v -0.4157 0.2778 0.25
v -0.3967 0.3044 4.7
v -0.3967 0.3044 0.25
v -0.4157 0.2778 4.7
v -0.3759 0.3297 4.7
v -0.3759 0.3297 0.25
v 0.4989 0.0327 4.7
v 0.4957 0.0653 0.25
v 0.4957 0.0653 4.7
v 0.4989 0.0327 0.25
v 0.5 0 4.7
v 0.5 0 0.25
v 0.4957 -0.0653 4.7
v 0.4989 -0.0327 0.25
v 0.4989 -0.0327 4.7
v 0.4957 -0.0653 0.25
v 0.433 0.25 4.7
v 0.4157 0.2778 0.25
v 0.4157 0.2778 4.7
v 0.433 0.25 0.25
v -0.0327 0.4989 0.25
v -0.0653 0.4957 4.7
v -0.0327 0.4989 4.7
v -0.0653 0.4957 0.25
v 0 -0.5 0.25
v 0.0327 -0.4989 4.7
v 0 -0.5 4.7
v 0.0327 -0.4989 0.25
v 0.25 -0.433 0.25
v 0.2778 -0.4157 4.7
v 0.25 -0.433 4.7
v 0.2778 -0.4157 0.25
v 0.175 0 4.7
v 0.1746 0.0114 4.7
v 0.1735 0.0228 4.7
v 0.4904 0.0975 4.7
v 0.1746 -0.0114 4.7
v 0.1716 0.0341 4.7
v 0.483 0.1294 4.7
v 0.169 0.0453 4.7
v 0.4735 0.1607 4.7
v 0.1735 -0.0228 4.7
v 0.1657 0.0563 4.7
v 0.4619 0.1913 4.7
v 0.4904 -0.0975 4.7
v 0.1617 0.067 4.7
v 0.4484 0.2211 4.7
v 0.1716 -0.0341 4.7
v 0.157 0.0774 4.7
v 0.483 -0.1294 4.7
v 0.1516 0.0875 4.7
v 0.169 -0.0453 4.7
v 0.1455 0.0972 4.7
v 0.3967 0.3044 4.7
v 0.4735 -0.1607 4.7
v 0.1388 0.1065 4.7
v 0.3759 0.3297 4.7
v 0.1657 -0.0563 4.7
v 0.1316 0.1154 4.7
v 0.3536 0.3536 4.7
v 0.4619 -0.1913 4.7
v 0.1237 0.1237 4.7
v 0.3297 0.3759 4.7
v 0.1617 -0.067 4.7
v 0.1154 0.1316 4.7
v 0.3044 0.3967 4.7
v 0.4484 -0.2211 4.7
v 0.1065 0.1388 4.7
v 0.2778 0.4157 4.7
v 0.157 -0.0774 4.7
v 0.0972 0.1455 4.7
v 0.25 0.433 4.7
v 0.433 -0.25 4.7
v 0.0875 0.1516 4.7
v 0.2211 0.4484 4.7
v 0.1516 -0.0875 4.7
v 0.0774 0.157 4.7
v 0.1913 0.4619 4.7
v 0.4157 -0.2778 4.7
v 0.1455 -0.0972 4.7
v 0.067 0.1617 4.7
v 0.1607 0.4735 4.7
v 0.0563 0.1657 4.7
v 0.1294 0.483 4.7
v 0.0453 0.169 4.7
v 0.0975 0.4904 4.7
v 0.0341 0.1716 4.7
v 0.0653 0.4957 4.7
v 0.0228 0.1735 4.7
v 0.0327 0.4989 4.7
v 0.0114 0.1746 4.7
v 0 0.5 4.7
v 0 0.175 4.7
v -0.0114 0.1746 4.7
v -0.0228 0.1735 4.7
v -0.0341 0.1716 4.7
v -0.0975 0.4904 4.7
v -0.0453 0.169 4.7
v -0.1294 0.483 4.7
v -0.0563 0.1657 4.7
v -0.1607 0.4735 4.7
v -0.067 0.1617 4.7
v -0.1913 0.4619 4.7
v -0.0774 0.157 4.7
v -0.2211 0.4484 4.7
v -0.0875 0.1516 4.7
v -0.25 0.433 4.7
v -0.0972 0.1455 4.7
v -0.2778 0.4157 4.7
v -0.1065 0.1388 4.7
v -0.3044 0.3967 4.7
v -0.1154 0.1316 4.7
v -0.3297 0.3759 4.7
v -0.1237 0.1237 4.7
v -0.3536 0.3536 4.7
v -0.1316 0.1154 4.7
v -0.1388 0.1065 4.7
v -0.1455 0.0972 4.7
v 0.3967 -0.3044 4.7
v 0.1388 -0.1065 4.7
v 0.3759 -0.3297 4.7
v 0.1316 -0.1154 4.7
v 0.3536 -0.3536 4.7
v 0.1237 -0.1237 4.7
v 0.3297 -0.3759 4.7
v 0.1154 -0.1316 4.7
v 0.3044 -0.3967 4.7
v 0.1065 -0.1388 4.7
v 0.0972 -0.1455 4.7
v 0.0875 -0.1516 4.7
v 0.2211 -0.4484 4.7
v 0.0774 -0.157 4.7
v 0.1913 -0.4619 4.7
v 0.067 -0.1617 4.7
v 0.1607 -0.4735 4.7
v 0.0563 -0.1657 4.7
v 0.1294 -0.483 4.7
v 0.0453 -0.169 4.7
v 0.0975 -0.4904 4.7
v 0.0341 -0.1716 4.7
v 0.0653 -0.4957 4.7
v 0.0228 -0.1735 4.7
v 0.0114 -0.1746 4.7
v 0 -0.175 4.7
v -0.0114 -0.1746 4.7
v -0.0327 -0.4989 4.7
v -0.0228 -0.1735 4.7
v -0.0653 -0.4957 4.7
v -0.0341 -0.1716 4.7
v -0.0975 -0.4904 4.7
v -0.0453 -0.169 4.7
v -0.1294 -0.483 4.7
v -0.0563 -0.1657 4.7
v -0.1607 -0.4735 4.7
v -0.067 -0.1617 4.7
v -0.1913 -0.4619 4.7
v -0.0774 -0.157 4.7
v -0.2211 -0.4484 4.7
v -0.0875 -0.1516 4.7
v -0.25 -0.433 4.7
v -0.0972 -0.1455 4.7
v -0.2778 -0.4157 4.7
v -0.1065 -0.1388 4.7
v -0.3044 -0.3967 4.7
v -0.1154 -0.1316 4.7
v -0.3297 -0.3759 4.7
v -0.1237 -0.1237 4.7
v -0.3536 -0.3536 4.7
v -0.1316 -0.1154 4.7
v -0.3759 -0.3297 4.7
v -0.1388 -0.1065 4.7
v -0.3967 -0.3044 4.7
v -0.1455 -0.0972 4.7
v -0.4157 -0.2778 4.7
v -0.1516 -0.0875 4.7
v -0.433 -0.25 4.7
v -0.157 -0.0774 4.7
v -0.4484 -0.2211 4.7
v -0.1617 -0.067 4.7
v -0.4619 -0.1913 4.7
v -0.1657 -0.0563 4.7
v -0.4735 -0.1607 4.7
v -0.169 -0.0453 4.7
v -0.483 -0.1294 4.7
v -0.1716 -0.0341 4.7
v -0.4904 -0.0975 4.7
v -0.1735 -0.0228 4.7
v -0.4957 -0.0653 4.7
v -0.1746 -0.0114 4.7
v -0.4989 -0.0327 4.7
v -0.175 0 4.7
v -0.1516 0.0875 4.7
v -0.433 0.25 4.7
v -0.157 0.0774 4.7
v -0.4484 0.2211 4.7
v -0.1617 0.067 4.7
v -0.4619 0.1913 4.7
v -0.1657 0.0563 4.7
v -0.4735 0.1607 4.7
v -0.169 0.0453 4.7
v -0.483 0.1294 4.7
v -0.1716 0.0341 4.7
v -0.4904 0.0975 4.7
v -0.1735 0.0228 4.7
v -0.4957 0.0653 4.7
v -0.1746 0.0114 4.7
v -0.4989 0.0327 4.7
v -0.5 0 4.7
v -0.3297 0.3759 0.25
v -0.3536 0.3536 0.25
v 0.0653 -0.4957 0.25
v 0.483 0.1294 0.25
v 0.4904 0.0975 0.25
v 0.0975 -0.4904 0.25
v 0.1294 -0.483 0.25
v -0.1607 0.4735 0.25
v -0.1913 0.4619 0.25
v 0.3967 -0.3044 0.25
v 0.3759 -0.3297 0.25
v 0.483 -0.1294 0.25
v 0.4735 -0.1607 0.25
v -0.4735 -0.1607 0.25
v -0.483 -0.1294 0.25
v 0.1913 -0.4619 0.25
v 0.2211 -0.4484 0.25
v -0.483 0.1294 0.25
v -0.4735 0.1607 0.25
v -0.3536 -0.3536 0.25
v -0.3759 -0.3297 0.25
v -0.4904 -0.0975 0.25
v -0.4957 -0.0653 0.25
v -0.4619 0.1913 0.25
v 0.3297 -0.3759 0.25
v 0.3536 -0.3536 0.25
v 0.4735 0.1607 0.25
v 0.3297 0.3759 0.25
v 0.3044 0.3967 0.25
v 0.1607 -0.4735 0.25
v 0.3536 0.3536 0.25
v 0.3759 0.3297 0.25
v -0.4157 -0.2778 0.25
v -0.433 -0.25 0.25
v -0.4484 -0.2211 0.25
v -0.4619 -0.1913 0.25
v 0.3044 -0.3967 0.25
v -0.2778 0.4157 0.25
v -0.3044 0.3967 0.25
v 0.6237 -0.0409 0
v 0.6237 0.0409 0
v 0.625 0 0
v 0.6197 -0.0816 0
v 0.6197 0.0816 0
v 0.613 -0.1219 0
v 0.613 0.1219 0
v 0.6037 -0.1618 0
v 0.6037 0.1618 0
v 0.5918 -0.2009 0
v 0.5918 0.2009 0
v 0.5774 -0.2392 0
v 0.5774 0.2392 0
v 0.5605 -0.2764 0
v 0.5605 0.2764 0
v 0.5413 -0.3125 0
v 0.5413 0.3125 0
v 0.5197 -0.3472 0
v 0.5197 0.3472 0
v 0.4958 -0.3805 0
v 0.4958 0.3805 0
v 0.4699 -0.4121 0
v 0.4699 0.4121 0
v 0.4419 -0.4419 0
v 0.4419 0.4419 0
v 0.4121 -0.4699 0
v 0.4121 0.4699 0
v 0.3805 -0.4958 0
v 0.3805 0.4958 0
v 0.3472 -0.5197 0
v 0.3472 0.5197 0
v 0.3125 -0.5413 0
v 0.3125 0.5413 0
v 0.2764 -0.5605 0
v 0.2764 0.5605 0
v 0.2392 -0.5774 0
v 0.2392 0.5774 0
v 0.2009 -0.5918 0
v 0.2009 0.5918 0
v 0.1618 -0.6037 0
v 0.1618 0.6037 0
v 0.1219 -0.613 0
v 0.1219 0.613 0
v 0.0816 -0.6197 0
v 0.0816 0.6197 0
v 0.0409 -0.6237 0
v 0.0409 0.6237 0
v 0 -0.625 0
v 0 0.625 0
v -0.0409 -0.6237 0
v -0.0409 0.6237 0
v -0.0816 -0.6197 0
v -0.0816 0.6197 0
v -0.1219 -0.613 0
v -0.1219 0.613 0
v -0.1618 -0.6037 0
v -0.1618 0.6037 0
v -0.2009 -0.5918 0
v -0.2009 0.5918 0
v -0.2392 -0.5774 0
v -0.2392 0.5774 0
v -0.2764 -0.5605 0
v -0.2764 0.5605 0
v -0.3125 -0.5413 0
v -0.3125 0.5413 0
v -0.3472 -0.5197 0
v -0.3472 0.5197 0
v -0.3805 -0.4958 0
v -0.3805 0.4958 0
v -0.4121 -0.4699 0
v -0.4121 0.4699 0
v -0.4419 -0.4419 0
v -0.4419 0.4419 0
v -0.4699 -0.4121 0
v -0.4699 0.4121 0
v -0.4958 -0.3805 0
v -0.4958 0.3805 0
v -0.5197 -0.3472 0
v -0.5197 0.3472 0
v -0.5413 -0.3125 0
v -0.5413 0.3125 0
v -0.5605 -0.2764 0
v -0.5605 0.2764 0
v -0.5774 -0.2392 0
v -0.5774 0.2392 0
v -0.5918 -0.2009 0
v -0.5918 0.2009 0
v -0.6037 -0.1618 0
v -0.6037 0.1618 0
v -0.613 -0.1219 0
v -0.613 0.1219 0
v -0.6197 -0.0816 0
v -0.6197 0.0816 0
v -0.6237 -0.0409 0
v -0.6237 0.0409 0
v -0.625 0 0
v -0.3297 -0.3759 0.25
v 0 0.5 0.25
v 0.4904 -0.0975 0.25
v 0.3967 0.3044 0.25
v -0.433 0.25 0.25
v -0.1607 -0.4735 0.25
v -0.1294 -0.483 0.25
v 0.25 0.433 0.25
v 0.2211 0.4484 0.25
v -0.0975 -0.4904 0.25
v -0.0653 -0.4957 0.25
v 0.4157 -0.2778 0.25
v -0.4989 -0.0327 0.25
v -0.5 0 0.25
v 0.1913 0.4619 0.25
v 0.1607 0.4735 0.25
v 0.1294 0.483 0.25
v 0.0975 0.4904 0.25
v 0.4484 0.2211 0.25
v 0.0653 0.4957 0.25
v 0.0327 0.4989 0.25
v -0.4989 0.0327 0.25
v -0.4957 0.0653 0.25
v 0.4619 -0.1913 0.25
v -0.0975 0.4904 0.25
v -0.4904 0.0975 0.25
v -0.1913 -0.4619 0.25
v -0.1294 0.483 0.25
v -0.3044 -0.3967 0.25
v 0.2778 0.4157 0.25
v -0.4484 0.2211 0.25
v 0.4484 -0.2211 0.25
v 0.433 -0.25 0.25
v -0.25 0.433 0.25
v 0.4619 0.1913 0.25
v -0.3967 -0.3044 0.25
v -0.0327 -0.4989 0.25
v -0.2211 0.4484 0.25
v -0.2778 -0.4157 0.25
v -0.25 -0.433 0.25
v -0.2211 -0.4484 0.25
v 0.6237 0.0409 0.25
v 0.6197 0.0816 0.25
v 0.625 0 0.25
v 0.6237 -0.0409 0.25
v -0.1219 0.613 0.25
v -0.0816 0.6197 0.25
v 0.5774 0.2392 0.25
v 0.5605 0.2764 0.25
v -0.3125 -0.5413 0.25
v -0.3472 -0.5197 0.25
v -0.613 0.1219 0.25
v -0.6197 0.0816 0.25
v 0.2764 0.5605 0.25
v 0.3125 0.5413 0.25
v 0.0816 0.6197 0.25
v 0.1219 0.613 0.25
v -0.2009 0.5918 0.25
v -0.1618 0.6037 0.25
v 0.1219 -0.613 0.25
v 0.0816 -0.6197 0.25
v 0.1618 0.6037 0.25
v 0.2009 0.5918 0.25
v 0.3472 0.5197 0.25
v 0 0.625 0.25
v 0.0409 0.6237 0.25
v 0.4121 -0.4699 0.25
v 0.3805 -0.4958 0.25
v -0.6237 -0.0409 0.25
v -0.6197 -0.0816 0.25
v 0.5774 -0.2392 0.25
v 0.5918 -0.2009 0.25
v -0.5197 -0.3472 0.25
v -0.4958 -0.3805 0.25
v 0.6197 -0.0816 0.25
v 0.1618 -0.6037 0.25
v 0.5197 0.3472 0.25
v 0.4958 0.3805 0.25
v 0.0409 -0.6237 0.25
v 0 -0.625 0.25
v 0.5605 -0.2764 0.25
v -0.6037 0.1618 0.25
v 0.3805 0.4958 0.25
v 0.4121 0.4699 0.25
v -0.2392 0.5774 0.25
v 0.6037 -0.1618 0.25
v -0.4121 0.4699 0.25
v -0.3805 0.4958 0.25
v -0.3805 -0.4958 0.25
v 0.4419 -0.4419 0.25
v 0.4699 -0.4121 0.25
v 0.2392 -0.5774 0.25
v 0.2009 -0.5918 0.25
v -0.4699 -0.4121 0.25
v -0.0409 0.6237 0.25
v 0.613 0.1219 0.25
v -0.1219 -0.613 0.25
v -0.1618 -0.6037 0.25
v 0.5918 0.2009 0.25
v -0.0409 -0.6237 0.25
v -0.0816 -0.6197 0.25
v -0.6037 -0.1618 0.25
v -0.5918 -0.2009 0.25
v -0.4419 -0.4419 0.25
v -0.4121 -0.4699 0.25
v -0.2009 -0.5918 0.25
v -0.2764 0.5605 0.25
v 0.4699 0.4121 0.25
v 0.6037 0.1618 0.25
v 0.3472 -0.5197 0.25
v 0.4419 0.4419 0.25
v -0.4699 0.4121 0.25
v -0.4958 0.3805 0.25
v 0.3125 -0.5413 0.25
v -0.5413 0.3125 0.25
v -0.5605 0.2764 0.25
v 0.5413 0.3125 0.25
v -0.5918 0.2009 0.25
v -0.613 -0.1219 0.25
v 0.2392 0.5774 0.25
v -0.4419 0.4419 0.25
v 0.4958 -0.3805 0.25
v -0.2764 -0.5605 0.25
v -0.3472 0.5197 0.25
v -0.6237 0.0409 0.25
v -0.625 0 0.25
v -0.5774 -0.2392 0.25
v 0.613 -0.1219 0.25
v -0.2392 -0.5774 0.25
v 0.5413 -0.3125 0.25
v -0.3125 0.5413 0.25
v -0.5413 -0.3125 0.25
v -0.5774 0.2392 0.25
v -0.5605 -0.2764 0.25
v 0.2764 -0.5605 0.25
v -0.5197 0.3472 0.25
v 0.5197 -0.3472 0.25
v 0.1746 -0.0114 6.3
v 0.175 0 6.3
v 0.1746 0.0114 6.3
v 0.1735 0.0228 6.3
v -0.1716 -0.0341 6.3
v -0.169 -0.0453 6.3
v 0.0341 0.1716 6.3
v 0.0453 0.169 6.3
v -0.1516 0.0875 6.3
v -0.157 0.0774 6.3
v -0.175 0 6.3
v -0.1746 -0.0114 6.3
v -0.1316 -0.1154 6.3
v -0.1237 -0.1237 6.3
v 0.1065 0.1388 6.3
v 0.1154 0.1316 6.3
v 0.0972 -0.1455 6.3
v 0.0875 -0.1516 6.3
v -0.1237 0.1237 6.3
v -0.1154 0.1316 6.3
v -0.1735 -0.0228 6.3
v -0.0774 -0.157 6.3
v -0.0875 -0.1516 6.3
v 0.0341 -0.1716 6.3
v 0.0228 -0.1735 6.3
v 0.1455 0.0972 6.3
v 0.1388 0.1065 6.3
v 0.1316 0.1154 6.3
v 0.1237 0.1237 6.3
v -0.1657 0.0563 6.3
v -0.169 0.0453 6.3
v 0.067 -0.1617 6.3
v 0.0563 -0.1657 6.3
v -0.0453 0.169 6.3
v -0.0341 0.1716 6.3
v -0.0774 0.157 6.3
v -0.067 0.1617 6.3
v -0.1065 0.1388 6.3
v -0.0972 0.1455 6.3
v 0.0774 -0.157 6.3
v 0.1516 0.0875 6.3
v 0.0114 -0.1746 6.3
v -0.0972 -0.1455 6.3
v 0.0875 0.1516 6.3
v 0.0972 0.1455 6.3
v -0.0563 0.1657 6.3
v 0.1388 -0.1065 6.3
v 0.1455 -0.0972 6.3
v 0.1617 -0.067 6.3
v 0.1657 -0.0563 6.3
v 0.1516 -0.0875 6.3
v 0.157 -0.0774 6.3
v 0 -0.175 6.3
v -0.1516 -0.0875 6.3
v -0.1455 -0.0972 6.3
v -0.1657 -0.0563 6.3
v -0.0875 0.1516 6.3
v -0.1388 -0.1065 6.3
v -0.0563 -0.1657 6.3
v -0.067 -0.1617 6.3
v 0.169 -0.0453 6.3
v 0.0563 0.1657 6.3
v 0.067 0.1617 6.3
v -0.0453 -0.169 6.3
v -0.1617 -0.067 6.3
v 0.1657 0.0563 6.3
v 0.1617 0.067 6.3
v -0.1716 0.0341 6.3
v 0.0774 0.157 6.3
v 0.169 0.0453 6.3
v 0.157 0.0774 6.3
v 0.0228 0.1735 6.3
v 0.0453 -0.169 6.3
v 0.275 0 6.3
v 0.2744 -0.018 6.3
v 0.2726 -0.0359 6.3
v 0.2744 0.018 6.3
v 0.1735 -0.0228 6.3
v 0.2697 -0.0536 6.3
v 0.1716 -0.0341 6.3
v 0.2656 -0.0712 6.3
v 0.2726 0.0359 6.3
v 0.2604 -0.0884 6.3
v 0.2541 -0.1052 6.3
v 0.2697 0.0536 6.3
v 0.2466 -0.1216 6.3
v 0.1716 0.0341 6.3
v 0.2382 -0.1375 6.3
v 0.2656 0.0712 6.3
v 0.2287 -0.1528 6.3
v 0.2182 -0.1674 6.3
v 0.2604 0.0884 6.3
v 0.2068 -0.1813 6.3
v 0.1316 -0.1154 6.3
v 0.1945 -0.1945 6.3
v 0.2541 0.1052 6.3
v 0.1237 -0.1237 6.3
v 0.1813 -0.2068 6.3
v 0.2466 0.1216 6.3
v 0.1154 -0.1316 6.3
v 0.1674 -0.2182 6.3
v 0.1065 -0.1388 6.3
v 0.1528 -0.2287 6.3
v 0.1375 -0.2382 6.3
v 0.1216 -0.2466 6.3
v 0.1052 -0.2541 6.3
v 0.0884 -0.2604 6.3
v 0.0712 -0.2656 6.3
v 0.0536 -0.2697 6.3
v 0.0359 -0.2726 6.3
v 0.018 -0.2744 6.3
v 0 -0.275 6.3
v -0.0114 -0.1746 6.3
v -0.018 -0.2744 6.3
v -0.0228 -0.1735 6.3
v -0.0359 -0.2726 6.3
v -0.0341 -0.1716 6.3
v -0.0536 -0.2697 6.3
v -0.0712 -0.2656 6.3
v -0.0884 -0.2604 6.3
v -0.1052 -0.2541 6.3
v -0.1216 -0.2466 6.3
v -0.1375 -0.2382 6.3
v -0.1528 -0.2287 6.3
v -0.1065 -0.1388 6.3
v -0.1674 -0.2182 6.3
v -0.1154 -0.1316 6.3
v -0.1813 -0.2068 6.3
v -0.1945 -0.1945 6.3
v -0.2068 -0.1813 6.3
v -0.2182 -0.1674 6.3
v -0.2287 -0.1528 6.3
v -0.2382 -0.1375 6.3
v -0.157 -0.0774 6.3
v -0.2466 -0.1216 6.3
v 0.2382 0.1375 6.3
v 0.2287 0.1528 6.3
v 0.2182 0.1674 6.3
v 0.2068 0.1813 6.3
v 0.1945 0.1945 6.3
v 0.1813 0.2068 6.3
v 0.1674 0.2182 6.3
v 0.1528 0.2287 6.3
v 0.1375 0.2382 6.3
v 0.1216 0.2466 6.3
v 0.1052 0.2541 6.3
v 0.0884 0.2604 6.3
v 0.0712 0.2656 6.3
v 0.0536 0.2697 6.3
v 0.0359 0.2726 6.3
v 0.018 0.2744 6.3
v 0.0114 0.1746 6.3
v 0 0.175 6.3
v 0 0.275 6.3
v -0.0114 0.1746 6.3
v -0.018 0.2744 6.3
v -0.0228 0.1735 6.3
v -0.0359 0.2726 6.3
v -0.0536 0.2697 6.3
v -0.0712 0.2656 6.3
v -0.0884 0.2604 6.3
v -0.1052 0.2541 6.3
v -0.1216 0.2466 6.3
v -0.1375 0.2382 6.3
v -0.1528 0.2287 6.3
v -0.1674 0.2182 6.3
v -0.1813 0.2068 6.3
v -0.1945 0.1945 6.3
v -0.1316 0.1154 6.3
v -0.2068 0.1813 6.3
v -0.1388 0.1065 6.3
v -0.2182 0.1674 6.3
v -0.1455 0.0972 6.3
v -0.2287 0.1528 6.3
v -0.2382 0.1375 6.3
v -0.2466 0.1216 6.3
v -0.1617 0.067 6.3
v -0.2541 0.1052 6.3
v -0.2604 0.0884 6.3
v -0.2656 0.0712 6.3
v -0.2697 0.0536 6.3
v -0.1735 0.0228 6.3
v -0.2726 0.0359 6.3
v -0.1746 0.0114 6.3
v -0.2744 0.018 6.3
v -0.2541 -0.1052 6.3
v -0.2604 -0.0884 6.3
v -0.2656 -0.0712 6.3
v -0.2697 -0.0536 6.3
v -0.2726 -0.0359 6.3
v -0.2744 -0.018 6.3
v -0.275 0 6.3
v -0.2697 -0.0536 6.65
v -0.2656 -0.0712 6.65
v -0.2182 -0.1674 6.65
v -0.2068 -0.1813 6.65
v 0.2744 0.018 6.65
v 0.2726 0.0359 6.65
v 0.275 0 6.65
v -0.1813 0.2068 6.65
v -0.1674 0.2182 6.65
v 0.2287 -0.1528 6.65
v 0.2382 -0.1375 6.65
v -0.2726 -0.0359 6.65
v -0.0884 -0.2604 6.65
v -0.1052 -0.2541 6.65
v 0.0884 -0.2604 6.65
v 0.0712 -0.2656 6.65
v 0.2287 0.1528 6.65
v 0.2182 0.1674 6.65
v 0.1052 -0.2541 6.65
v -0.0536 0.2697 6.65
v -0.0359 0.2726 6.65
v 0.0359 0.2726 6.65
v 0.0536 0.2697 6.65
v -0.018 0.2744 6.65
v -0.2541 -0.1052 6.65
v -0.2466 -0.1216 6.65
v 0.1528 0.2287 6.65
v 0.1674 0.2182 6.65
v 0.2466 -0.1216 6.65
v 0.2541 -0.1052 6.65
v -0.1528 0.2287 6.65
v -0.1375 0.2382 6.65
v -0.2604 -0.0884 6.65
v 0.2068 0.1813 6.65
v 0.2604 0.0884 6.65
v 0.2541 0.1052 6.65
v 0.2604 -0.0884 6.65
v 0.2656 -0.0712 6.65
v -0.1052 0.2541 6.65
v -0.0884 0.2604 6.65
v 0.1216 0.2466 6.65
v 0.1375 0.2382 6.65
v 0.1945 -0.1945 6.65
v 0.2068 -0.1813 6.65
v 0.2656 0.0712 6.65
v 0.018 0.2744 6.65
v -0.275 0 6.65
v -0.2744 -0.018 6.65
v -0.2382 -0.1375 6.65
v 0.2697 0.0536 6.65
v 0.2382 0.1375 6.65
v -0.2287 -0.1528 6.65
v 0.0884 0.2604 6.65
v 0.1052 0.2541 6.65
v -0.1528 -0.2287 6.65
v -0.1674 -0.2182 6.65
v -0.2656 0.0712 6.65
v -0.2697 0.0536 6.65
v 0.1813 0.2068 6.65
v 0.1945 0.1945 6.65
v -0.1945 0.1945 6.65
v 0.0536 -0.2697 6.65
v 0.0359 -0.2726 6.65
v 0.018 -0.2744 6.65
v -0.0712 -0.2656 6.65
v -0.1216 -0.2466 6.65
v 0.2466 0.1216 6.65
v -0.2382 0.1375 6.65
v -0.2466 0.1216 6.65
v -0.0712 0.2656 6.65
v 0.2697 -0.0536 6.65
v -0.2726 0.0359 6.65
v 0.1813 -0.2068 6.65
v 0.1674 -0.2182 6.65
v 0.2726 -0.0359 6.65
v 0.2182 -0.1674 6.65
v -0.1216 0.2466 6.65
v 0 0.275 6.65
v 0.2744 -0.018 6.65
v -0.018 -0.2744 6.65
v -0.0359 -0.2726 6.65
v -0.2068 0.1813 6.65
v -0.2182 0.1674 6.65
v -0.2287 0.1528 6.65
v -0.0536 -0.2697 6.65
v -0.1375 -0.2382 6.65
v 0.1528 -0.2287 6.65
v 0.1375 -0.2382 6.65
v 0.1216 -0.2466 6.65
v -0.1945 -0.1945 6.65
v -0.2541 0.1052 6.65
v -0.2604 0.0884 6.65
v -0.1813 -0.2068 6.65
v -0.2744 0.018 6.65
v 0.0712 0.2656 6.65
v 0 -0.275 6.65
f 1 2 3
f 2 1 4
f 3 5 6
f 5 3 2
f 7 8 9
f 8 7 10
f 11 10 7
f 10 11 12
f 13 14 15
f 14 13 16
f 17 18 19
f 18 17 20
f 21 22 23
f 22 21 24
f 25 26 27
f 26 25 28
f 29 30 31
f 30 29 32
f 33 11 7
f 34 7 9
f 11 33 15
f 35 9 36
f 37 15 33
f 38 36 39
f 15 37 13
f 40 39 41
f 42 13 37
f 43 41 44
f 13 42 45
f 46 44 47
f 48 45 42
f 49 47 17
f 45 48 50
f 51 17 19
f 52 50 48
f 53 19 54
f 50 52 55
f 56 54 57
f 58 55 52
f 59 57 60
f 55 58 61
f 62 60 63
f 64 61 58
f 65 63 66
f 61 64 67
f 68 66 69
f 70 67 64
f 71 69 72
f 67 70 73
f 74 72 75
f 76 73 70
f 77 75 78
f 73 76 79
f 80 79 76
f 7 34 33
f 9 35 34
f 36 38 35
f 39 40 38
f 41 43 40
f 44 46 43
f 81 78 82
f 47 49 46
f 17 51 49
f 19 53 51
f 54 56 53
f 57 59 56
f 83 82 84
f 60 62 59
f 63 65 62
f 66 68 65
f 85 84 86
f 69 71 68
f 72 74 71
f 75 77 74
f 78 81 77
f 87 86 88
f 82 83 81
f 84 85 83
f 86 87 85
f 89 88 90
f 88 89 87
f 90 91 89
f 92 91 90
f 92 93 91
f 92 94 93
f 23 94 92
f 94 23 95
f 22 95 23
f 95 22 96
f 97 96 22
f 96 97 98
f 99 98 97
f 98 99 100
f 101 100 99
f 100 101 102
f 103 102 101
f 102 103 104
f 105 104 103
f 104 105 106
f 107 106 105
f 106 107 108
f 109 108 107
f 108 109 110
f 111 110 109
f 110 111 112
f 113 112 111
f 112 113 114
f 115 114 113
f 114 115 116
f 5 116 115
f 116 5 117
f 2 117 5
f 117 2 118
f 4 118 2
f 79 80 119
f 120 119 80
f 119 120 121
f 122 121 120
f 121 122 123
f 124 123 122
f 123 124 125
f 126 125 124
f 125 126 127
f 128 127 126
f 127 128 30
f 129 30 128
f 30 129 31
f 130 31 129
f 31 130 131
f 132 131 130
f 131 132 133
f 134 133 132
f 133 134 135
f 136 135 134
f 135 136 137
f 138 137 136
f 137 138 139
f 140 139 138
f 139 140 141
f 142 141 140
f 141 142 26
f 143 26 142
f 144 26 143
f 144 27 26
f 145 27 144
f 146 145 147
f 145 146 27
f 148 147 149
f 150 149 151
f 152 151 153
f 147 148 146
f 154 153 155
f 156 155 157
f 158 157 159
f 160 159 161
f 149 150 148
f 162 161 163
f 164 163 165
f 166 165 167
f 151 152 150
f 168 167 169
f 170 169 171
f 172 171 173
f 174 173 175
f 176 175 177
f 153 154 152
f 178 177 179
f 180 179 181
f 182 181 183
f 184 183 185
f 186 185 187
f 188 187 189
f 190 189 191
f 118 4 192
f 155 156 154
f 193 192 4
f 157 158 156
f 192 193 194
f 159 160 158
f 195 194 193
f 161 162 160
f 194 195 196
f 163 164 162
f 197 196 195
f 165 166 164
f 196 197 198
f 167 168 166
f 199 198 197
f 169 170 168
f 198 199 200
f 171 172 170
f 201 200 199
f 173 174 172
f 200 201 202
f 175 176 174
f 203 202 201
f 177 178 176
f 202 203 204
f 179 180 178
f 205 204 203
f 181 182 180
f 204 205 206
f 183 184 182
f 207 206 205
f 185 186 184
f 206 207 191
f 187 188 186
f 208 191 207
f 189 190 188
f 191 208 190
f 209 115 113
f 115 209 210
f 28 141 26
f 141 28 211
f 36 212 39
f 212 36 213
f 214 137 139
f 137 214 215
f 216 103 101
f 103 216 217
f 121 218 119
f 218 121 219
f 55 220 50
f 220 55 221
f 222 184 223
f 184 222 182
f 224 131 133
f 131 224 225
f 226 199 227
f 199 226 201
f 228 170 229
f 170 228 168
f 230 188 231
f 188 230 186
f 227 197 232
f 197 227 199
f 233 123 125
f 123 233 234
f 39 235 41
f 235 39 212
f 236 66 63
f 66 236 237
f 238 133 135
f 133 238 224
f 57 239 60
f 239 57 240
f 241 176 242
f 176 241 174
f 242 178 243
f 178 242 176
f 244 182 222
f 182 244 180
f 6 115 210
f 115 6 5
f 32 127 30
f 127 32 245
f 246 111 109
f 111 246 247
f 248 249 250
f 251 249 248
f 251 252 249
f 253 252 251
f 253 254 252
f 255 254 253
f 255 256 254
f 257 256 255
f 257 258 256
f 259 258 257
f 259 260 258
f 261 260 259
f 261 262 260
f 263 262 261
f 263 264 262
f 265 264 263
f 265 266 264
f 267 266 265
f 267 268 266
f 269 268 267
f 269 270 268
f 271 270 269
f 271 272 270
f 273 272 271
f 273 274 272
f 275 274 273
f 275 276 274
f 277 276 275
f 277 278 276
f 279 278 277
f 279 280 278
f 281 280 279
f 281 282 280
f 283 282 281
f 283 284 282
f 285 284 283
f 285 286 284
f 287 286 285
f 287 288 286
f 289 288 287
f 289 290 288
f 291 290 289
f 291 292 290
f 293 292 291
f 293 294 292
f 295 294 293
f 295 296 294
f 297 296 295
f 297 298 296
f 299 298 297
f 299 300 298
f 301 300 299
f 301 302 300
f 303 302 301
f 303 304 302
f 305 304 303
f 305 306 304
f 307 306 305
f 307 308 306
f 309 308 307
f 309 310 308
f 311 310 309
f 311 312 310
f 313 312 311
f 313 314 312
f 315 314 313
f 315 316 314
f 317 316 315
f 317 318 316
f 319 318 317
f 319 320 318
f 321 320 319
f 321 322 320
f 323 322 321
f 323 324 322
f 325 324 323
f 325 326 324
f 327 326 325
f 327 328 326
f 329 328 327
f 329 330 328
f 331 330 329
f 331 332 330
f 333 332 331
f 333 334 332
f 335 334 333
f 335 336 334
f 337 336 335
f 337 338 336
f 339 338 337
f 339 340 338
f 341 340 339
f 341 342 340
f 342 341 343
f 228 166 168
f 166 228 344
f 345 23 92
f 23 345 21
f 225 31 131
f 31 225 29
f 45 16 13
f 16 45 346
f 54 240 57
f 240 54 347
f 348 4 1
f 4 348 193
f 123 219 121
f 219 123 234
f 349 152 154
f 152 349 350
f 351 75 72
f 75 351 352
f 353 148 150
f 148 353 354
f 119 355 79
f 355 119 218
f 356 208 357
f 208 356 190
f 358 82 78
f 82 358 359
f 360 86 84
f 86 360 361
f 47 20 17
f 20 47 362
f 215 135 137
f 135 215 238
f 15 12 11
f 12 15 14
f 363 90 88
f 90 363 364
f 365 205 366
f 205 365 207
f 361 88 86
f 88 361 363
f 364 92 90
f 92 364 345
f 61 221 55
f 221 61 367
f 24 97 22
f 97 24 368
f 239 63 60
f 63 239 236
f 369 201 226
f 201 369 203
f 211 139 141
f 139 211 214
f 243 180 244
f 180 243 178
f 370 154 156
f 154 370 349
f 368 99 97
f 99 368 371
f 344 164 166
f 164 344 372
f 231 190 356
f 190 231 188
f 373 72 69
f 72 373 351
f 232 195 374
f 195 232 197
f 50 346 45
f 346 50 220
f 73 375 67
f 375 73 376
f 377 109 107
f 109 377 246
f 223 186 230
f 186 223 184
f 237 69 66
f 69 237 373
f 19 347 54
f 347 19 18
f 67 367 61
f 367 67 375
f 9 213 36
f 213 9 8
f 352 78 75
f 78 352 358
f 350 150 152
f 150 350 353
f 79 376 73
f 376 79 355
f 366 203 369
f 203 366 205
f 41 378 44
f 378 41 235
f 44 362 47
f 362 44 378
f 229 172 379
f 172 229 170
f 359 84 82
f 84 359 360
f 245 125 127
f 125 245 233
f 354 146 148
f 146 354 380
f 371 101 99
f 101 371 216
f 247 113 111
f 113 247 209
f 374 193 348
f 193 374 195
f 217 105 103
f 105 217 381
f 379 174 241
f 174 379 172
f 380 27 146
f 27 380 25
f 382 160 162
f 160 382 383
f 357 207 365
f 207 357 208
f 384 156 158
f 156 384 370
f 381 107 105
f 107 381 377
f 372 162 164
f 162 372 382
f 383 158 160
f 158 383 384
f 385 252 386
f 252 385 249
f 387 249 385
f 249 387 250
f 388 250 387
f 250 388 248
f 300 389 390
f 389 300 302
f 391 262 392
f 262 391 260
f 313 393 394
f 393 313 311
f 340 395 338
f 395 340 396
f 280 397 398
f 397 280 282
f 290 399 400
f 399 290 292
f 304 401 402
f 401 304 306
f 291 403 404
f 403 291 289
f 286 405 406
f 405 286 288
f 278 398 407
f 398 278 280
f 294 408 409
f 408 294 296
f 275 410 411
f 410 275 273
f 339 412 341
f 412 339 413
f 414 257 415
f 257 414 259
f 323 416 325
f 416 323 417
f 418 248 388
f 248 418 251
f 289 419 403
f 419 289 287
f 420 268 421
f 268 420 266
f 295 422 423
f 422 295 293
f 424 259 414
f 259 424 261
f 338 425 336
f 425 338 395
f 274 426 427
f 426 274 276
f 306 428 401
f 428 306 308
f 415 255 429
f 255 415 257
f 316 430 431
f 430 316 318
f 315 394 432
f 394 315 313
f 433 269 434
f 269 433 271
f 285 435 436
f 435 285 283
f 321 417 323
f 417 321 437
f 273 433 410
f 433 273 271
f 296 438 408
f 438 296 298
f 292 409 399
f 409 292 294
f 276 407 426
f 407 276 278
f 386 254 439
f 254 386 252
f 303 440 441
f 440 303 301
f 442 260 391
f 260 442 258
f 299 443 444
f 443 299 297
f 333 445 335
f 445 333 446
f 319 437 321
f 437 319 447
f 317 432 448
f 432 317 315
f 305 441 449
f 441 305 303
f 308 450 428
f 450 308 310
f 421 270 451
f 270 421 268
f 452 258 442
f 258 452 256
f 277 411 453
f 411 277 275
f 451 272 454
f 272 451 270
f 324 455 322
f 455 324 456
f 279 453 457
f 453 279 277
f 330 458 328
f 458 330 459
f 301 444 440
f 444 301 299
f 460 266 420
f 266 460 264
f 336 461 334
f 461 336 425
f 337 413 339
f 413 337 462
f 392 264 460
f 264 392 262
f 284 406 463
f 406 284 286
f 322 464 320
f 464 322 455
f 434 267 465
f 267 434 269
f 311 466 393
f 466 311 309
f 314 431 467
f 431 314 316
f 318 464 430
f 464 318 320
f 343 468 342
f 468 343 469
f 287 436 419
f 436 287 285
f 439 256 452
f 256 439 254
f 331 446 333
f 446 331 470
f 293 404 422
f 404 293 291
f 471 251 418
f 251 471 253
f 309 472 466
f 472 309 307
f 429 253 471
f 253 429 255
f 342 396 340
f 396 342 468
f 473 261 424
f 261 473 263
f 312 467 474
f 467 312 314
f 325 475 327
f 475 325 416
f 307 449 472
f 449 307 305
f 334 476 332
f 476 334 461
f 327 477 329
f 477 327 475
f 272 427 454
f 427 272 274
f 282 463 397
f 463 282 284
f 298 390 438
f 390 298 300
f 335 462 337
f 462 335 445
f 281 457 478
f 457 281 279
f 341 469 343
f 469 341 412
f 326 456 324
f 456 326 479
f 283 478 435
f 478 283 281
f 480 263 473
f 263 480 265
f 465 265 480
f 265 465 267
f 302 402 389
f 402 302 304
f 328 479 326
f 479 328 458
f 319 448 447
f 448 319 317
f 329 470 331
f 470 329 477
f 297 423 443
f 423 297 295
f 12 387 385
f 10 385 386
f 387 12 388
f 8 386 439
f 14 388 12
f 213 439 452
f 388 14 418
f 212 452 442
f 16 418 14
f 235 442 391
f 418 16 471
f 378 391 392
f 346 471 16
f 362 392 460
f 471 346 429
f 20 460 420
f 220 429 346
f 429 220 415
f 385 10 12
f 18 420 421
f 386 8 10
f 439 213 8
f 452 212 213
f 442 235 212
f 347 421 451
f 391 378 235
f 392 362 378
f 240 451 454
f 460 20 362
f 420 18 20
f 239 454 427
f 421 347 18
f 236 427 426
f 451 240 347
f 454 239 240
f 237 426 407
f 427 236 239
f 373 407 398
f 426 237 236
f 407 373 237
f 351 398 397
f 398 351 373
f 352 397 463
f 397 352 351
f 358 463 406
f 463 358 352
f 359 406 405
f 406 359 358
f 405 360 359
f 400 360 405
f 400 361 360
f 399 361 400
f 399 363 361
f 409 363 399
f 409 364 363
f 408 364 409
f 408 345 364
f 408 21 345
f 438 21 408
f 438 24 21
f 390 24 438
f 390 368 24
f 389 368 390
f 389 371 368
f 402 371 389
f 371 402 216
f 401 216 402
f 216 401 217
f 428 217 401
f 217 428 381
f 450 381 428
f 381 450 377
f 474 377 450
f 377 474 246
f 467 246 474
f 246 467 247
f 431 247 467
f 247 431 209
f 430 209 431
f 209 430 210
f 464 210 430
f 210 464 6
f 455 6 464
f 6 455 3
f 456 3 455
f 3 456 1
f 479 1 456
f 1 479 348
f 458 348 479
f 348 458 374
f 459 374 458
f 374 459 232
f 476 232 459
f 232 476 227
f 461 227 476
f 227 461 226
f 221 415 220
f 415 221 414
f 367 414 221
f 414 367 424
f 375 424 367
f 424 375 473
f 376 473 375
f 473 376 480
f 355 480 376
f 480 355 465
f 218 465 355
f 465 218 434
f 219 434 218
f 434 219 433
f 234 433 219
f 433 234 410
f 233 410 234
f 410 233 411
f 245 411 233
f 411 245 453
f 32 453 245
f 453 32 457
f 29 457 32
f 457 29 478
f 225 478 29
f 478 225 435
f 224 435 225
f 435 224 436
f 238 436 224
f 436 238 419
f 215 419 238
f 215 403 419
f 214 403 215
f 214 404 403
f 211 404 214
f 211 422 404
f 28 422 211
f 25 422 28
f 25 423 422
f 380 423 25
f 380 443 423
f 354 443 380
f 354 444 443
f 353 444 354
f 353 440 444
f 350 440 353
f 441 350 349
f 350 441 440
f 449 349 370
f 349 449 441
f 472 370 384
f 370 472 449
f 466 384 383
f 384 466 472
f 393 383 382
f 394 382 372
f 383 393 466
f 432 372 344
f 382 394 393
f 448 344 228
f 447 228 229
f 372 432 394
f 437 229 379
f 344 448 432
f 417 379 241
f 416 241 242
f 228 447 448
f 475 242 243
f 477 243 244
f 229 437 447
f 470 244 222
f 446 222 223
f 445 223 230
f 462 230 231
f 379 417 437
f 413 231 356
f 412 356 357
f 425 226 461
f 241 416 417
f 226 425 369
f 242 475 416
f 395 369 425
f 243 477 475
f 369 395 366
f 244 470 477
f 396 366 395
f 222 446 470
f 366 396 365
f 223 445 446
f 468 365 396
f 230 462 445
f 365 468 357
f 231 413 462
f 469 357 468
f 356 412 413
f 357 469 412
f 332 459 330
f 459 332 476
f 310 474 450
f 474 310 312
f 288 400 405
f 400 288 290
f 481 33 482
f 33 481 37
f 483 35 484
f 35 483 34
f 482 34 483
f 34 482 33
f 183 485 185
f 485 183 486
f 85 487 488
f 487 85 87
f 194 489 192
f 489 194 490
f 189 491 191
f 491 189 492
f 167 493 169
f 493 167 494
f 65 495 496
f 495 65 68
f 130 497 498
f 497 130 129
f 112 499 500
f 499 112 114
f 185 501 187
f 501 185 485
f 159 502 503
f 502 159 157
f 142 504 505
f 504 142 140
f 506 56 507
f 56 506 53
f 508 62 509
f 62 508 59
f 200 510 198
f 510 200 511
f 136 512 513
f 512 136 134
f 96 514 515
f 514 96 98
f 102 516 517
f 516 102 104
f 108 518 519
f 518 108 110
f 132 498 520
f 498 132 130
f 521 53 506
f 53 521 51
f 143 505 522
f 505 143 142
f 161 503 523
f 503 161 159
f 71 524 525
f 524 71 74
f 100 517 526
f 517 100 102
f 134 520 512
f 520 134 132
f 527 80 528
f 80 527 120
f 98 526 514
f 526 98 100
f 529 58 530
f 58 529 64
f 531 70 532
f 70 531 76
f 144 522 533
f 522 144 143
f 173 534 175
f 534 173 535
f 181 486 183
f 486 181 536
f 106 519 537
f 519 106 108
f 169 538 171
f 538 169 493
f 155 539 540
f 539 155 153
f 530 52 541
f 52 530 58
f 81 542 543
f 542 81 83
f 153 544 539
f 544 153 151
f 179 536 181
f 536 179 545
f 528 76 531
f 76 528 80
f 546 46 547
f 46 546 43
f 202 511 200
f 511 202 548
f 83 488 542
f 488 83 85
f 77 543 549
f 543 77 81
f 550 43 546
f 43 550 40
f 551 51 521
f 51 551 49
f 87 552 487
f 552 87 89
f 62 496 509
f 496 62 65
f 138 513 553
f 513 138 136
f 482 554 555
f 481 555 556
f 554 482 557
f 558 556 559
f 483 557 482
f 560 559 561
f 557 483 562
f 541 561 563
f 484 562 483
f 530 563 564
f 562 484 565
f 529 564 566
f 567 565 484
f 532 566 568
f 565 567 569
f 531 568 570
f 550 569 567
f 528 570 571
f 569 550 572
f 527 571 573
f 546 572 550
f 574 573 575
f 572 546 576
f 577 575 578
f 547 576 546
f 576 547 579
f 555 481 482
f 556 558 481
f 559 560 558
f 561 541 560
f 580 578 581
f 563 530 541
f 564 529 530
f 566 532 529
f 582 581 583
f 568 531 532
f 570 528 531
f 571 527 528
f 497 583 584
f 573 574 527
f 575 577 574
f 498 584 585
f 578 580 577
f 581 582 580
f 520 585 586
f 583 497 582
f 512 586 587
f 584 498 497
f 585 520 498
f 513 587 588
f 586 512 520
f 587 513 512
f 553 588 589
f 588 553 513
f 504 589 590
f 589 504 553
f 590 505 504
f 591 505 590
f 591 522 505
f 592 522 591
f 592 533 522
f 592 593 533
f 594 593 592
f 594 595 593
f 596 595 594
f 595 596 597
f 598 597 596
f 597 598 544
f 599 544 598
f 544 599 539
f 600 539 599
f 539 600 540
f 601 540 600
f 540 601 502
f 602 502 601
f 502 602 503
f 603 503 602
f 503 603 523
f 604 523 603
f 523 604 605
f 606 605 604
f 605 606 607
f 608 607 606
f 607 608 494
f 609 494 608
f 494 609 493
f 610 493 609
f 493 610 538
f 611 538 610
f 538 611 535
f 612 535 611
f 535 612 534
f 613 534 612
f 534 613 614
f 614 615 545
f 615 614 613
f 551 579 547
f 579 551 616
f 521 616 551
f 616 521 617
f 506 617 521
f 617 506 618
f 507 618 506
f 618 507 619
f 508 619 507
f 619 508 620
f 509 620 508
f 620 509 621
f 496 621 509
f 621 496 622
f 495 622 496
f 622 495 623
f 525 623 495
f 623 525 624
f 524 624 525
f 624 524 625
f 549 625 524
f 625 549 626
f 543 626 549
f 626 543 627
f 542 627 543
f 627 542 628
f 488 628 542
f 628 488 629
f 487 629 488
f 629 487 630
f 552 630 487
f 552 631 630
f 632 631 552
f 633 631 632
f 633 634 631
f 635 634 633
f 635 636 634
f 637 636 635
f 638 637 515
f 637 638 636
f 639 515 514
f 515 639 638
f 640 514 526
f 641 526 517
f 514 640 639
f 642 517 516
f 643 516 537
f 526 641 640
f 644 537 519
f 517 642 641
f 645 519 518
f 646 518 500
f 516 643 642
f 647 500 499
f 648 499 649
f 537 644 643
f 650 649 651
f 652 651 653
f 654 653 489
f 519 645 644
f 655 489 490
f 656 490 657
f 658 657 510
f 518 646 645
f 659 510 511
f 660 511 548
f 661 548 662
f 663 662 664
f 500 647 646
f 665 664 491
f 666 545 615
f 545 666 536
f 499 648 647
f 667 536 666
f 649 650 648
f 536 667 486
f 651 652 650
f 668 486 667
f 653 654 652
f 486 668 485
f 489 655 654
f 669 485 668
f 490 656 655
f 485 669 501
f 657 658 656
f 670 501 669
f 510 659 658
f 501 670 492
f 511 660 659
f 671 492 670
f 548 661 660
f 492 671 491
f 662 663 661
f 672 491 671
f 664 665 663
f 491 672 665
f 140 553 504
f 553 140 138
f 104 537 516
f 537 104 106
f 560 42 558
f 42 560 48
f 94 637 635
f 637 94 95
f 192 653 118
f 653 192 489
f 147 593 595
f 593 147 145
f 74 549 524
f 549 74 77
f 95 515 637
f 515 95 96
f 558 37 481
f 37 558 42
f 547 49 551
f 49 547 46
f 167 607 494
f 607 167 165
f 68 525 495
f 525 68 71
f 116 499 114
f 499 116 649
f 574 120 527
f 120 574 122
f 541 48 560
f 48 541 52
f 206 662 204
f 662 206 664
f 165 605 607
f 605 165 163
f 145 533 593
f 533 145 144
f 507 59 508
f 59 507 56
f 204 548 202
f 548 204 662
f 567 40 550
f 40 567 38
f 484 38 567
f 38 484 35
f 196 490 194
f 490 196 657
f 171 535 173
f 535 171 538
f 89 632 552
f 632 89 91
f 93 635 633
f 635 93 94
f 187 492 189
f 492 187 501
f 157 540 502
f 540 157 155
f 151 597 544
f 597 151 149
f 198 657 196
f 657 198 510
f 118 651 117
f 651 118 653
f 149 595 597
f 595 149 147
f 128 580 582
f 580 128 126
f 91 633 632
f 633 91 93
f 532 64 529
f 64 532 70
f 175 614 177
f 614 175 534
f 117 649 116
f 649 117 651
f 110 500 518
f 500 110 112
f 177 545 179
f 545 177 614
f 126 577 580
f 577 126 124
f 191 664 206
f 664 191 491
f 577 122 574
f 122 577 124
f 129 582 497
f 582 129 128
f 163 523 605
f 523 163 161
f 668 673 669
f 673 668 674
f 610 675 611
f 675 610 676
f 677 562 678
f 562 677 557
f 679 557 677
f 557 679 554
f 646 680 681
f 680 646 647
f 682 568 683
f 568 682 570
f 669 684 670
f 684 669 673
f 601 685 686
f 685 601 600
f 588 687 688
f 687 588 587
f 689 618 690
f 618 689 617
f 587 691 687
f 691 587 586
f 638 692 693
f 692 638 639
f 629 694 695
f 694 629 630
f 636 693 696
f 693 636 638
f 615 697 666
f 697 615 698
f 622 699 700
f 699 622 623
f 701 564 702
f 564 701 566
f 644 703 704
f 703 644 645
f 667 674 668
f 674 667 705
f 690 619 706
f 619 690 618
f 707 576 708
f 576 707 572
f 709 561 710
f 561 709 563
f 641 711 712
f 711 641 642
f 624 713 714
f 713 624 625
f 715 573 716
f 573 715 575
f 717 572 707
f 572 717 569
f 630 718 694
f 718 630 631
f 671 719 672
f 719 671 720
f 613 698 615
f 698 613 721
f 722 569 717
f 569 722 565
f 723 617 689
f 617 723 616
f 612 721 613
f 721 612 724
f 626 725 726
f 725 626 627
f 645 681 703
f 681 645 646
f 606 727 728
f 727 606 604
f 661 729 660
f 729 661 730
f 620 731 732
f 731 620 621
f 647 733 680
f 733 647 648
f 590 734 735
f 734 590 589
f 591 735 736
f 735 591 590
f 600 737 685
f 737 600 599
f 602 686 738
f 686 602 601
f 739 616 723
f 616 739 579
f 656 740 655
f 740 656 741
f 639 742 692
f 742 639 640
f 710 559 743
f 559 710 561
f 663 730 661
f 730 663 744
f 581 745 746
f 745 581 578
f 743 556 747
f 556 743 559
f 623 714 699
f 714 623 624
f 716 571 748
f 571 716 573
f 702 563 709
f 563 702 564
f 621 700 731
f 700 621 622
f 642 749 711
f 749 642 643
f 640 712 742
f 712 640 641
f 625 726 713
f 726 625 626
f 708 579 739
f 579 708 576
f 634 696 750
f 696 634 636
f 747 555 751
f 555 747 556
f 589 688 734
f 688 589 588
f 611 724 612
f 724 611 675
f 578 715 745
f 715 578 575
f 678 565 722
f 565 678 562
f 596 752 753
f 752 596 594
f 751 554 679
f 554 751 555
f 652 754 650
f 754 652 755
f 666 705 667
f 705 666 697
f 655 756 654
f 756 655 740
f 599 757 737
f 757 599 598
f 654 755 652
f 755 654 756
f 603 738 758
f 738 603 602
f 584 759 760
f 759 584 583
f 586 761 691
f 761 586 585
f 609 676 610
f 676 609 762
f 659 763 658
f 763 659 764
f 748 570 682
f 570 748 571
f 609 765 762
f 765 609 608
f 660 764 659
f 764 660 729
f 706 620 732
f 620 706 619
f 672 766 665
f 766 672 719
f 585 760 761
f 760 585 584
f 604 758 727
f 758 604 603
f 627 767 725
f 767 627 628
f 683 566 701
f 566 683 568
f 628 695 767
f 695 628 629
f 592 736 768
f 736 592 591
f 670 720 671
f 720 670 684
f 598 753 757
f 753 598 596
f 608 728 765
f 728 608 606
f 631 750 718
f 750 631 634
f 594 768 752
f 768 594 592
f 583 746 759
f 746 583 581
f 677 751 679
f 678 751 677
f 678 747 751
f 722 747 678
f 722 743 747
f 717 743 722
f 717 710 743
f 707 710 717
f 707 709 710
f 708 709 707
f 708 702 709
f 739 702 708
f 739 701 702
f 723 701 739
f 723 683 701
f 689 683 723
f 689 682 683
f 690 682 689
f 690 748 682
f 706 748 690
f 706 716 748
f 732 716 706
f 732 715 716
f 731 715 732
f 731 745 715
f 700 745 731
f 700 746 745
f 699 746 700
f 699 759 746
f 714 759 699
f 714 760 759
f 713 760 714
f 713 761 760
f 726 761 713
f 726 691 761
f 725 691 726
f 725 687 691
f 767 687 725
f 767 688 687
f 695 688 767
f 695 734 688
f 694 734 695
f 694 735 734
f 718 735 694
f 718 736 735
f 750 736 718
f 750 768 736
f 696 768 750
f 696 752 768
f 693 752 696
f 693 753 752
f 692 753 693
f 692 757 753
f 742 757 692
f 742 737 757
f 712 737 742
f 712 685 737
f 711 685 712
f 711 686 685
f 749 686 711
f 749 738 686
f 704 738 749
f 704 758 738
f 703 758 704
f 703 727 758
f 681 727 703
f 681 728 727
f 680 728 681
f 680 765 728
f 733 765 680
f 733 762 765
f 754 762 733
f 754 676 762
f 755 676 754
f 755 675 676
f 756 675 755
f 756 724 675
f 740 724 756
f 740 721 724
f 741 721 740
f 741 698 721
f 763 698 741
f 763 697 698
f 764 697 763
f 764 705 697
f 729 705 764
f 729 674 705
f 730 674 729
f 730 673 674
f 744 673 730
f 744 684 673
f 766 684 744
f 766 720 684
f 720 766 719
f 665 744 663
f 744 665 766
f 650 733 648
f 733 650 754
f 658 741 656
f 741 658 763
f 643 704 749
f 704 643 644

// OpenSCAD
$fn = 96;

body_d = 1.0;
body_h = 4.7;

stem_d = 0.35;
stem_h = 1.6;

cap_d = 0.55;
cap_h = 0.35;

base_flange_d = 1.25;
base_flange_h = 0.25;

module toggle_switch() {
    union() {
        // Main cylindrical body
        cylinder(d=body_d, h=body_h);

        // Small base flange
        translate([0,0,0])
            cylinder(d=base_flange_d, h=base_flange_h);

        // Toggle stem
        translate([0,0,body_h])
            cylinder(d=stem_d, h=stem_h);

        // Small cap on top of stem
        translate([0,0,body_h + stem_h])
            cylinder(d=cap_d, h=cap_h);
    }
}

toggle_switch();
